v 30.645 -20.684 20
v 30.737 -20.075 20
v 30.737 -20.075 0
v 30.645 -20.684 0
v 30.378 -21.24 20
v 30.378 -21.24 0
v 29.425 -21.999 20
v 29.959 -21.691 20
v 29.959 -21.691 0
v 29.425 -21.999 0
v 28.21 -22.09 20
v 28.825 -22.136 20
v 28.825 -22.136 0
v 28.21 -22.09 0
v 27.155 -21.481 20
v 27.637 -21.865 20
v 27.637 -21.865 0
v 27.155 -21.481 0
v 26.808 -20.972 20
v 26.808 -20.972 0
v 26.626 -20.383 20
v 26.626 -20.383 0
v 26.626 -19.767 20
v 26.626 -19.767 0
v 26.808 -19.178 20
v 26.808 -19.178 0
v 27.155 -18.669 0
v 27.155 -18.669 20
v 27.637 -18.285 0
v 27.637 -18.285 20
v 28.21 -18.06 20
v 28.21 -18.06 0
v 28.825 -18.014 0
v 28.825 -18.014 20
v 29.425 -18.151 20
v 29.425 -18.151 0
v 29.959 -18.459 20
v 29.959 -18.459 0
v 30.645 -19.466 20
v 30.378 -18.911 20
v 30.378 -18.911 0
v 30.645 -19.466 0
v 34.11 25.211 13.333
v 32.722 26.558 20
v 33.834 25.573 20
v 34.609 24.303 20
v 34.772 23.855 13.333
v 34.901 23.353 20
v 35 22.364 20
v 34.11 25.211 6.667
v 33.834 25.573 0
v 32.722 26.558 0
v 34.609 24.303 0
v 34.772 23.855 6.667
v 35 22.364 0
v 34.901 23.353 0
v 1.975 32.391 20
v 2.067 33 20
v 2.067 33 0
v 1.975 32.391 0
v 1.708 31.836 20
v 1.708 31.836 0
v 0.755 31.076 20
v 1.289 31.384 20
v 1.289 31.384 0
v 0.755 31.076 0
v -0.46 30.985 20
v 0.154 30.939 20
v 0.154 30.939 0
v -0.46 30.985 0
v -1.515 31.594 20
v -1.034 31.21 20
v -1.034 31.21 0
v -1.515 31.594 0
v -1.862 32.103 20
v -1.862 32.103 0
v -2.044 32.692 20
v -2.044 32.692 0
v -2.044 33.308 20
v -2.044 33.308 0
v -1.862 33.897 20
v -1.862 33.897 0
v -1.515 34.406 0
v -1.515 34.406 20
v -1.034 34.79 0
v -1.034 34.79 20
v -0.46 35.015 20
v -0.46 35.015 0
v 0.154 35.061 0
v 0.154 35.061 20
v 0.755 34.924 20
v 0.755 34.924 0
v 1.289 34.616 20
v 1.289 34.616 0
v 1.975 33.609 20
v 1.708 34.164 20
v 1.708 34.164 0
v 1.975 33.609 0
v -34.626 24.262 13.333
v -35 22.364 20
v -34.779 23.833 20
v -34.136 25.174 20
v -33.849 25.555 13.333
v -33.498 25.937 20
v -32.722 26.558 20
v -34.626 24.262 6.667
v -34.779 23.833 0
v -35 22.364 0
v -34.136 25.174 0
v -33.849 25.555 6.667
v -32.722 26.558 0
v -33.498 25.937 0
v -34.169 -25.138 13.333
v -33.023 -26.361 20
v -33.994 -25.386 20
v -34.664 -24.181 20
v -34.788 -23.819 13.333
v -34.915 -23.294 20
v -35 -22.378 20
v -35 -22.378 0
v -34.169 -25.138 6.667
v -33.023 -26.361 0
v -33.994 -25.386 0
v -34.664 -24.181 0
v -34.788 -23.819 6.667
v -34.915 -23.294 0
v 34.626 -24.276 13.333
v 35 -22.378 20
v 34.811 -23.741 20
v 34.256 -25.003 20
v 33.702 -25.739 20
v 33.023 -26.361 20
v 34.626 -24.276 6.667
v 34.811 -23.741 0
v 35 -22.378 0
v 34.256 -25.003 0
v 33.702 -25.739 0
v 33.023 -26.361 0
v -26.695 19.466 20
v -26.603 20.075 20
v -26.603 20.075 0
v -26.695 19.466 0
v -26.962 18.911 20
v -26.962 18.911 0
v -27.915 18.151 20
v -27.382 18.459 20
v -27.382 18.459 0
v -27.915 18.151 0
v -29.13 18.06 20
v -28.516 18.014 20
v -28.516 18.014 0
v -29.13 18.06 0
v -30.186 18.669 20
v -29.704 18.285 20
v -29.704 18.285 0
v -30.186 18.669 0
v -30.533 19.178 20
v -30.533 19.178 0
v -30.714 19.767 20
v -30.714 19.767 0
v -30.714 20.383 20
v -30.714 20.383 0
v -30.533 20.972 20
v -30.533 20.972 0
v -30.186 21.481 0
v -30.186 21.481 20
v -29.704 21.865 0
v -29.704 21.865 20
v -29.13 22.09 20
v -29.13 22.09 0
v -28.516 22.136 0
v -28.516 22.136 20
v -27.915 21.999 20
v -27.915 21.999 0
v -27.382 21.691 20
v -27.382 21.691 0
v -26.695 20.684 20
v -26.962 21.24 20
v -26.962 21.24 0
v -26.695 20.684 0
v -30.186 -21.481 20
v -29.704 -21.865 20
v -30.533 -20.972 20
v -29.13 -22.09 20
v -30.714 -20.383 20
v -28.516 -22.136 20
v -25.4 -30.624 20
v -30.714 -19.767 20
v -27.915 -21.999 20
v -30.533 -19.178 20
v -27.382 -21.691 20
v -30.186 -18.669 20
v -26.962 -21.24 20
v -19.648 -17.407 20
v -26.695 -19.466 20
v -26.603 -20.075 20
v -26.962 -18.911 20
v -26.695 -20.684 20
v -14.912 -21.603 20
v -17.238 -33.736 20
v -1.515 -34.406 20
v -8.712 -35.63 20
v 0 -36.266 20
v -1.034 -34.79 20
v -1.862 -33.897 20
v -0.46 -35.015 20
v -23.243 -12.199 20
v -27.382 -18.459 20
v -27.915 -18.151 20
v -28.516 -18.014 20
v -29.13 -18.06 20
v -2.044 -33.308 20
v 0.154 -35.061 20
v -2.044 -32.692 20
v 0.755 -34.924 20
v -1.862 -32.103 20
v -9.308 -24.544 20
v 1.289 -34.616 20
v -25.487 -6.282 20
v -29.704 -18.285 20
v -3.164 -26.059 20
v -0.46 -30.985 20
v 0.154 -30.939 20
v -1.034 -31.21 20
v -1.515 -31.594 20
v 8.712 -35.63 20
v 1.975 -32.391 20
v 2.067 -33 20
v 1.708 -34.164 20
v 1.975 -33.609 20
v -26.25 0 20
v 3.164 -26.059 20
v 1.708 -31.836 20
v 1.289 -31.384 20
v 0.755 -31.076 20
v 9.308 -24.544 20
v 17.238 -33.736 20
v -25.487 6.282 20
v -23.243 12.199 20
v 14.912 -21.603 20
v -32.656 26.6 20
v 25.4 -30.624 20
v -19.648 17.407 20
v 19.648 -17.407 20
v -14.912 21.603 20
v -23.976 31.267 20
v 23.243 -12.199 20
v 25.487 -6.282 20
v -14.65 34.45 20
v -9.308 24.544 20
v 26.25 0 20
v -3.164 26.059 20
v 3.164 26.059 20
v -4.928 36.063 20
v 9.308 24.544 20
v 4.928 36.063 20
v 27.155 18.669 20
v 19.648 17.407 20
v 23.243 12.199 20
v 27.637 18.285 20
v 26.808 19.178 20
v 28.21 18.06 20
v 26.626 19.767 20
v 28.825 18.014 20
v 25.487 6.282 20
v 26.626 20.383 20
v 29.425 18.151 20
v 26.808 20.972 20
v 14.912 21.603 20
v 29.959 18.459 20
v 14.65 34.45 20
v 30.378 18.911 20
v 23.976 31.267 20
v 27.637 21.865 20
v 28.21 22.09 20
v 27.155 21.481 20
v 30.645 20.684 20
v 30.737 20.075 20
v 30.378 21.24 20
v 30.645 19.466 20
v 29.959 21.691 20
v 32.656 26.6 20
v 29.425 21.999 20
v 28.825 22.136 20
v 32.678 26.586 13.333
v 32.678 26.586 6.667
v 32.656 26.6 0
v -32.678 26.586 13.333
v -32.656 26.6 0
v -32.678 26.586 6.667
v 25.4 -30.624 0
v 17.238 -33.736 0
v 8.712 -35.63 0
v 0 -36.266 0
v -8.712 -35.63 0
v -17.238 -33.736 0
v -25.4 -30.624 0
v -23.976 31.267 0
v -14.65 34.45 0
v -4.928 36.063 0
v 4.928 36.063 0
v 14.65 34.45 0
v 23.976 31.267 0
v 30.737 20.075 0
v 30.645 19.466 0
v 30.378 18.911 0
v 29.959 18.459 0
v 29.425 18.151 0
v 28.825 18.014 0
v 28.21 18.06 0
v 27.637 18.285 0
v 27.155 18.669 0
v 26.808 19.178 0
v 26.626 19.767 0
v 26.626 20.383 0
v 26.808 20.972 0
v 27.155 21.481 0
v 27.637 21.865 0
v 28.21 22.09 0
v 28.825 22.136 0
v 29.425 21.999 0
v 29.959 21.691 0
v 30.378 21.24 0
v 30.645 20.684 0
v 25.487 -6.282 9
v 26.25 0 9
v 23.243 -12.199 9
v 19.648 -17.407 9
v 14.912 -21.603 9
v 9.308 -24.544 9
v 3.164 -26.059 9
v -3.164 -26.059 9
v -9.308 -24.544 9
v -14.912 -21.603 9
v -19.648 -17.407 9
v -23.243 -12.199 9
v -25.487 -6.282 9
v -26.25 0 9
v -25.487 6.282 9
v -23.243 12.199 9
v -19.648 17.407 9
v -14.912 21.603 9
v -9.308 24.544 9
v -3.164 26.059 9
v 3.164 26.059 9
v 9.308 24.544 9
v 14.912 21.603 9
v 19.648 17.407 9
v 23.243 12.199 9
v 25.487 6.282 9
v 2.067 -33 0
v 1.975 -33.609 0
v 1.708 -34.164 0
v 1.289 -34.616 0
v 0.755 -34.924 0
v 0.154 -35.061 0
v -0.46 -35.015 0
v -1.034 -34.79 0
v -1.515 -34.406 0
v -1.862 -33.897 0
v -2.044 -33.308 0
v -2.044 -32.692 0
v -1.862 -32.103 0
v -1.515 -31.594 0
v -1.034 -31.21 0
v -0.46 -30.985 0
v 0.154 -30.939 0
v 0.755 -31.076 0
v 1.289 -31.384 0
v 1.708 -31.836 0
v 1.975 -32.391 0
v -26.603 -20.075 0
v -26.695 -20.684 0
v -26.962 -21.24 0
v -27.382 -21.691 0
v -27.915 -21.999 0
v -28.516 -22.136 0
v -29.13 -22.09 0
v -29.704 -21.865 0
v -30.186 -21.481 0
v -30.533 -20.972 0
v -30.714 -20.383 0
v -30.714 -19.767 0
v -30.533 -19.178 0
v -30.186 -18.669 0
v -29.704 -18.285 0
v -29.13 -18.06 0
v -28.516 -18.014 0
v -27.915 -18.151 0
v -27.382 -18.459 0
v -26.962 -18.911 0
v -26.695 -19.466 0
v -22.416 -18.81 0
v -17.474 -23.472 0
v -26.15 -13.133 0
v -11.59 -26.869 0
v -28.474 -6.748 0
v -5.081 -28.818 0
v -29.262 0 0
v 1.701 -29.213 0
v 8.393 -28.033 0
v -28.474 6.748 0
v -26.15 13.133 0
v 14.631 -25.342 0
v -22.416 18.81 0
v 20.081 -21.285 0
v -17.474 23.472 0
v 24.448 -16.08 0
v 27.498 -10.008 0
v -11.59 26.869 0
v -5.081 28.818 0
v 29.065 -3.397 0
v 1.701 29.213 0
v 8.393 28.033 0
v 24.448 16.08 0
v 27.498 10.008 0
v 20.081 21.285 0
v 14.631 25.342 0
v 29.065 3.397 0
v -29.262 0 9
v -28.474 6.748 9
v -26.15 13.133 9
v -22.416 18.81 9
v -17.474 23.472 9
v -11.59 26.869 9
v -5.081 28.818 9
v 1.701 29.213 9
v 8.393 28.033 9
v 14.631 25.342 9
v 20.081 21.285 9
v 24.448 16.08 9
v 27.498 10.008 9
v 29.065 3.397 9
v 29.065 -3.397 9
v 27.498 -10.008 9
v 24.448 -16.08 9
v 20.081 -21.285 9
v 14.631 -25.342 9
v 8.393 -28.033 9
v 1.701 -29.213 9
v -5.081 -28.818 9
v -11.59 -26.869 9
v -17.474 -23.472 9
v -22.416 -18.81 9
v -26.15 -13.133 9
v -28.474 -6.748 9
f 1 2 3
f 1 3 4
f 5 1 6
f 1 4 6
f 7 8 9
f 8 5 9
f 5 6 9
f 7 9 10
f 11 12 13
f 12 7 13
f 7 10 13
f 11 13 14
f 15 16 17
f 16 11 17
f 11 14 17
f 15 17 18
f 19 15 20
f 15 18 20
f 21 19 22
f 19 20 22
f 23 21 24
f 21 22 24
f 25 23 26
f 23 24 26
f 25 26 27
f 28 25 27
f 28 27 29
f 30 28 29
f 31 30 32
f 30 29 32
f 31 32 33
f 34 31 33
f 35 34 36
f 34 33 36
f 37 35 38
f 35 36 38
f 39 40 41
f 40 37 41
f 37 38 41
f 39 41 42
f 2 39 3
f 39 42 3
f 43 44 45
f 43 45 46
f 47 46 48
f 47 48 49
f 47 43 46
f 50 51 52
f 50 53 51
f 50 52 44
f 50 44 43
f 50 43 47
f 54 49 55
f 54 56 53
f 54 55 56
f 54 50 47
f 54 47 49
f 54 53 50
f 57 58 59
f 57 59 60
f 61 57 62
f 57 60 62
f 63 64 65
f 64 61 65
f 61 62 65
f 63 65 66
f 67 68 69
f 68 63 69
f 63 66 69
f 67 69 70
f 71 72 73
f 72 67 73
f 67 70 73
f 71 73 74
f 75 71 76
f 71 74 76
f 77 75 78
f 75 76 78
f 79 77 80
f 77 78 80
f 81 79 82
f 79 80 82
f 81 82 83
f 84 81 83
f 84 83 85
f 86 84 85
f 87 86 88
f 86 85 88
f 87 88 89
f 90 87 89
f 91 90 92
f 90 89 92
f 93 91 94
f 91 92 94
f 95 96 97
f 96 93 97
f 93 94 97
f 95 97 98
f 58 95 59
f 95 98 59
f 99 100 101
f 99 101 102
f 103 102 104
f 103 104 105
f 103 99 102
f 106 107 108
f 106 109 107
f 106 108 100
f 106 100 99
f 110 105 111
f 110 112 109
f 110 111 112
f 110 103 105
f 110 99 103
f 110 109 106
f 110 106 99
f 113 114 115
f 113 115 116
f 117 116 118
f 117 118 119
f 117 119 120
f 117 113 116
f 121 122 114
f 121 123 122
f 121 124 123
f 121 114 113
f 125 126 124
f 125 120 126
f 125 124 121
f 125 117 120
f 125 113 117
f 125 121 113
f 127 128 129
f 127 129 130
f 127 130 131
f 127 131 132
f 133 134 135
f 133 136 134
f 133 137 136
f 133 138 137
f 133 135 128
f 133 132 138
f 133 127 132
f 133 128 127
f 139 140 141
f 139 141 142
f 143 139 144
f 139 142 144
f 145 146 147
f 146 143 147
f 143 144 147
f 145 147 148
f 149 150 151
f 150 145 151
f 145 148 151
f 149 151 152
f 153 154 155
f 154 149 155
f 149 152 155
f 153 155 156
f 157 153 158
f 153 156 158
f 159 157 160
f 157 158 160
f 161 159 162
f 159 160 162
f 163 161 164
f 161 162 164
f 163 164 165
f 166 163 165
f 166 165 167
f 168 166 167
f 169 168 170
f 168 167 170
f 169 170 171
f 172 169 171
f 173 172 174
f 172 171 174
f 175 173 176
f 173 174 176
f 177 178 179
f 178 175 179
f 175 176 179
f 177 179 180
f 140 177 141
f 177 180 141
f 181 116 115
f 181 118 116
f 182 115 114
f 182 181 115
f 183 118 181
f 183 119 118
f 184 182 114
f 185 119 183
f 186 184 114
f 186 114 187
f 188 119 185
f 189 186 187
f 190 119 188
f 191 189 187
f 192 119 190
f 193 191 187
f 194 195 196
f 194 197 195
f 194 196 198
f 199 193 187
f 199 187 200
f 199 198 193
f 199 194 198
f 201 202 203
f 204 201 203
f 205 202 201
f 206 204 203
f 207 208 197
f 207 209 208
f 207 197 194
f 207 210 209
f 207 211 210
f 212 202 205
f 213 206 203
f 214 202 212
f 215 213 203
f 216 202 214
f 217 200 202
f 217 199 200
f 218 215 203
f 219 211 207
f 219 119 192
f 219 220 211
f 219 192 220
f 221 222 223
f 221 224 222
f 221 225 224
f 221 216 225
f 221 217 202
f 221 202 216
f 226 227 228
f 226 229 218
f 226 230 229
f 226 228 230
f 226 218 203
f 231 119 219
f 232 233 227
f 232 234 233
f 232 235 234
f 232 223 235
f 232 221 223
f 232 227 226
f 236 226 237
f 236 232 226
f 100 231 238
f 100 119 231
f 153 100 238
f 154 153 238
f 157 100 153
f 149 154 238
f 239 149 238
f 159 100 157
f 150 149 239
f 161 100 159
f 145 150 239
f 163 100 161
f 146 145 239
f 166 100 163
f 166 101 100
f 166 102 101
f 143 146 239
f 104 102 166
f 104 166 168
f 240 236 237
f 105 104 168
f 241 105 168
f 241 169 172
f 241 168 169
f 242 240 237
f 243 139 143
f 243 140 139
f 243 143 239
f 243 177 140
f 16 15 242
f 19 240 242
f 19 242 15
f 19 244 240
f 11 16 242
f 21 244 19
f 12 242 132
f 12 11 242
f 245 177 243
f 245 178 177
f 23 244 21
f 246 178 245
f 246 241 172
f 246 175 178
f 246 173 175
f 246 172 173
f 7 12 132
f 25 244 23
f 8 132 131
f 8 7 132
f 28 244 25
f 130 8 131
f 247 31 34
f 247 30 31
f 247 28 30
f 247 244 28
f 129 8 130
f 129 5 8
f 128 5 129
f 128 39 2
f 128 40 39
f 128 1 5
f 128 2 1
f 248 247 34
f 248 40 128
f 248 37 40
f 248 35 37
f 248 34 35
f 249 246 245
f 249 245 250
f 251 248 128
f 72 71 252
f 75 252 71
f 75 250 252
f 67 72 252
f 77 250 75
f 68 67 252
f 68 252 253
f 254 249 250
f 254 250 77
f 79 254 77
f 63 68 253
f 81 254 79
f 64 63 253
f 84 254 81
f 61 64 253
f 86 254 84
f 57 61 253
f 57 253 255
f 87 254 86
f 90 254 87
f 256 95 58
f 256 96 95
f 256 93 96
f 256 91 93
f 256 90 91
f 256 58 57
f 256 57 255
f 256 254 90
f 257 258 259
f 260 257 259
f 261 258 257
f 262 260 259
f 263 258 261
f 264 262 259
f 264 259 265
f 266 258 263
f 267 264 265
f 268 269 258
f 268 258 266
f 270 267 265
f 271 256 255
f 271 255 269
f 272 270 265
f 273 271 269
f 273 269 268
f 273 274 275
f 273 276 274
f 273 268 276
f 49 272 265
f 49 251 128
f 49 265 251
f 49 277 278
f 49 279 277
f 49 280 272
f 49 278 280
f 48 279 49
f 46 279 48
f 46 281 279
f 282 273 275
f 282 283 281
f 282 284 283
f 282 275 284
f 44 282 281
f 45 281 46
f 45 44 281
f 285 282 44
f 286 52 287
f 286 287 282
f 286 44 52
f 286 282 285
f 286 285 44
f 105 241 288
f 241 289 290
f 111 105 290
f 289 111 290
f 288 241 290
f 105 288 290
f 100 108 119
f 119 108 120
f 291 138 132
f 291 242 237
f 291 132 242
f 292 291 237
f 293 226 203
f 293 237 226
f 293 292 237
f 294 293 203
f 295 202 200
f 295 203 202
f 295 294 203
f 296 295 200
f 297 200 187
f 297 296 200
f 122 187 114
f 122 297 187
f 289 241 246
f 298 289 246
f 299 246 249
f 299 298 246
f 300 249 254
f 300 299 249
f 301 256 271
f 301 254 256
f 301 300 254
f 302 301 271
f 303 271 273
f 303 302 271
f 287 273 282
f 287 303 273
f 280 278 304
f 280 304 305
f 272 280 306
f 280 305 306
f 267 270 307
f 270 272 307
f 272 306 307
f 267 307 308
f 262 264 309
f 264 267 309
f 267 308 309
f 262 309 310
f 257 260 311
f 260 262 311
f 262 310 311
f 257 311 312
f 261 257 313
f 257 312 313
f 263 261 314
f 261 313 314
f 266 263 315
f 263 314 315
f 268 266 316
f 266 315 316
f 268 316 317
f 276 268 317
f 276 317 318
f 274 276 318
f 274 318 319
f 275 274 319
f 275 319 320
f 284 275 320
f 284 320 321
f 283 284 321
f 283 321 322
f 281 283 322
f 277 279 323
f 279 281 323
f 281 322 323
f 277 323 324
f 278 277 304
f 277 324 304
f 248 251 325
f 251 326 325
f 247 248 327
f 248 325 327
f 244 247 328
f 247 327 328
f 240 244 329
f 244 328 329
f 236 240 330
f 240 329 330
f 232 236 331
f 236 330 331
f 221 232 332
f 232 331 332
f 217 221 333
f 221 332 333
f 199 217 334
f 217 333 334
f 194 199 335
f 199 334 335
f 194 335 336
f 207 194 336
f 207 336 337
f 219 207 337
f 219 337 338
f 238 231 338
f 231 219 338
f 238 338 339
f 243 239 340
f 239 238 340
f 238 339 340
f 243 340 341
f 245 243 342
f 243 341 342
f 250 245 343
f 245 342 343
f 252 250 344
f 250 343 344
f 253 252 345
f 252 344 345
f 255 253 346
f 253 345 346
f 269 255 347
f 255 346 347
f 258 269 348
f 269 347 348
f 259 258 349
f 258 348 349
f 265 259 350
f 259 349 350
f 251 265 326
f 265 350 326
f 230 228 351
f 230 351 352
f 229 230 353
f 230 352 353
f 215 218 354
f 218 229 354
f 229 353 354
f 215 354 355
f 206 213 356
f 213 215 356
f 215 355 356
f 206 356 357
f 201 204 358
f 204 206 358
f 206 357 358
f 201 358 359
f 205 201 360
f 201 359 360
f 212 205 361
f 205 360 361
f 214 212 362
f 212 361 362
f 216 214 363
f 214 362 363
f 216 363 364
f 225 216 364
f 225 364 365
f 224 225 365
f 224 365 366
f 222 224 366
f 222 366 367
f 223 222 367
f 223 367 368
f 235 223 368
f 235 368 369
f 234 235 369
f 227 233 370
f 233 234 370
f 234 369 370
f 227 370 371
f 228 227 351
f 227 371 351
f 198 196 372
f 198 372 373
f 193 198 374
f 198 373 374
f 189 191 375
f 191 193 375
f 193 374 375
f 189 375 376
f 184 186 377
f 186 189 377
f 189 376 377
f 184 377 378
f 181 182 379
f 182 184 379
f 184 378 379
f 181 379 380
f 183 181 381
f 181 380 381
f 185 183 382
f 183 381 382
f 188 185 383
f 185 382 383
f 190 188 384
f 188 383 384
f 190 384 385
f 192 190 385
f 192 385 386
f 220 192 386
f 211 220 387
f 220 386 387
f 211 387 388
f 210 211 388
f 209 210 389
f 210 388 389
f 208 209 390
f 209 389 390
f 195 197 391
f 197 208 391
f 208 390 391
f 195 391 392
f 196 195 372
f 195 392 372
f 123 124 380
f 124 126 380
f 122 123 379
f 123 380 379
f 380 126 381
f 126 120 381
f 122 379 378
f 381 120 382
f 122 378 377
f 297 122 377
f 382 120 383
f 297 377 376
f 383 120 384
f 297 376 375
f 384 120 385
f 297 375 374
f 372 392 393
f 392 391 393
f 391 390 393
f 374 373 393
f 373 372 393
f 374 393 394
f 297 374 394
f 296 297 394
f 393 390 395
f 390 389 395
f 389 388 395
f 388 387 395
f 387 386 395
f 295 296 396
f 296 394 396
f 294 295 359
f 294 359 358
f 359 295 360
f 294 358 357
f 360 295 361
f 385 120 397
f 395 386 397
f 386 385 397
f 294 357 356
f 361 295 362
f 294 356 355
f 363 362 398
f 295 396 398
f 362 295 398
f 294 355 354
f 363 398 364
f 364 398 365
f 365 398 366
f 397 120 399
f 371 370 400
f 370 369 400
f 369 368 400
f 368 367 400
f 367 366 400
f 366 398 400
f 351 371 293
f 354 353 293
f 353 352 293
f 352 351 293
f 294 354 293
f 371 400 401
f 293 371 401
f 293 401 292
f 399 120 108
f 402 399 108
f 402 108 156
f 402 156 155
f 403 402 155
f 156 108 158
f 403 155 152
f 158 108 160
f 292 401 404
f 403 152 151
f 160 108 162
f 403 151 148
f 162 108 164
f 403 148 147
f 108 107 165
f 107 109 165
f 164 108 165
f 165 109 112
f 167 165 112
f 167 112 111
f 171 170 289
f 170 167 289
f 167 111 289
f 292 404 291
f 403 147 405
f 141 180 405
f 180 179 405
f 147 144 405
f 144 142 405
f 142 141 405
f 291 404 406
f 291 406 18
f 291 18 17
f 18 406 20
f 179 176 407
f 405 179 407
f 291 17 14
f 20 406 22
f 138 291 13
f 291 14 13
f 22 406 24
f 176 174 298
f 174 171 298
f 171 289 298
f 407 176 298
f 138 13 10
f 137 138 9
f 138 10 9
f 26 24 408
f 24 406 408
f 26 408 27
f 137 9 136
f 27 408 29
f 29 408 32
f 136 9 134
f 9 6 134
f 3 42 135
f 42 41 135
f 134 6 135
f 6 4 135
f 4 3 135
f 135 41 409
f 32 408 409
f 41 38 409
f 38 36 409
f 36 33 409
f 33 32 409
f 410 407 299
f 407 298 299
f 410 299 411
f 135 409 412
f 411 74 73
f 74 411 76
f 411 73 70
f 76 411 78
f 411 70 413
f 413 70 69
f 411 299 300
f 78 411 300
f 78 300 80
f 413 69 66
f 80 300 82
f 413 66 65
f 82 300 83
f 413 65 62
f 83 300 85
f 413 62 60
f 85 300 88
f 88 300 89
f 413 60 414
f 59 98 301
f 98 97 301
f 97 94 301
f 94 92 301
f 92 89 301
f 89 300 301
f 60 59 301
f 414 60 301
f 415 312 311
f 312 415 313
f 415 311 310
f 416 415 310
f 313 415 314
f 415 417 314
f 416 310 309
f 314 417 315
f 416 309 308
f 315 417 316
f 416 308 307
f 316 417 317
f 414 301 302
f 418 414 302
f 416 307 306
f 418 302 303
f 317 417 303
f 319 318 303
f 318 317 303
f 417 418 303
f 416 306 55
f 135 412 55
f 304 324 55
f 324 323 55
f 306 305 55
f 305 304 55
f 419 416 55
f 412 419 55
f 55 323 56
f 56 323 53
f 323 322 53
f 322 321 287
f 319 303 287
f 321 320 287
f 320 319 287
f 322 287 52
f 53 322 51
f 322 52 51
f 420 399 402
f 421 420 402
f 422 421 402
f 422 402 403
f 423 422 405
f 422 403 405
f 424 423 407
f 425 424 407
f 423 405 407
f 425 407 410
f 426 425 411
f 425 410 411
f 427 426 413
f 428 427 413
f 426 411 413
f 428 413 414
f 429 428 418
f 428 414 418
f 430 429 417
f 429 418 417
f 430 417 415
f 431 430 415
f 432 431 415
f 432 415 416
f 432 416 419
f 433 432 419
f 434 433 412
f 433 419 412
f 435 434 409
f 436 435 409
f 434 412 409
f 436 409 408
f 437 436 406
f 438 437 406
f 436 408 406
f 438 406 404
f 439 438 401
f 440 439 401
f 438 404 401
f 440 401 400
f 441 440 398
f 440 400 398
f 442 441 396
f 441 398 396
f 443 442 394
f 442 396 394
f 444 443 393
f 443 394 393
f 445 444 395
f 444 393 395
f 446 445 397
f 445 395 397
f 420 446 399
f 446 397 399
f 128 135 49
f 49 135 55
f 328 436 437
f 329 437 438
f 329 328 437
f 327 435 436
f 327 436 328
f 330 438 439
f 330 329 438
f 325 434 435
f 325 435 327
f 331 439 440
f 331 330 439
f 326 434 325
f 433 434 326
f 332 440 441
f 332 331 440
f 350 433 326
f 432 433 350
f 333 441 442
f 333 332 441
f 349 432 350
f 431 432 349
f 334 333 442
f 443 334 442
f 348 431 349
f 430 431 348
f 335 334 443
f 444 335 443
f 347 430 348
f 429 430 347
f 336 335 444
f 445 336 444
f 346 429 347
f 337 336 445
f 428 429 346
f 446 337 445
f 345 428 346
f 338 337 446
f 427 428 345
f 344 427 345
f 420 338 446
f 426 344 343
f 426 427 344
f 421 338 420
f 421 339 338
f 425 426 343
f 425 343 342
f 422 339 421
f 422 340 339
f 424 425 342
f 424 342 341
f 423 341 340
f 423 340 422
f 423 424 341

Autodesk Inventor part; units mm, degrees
ref_plane "YZ Plane" through (0, 0, 0) normal (1, 0, 0) x (0, 1, 0)
ref_plane "XZ Plane" through (0, 0, 0) normal (0, 1, 0) x (-1, 0, 0)
ref_plane "XY Plane" through (0, 0, 0) normal (0, 0, 1) x (1, 0, 0)
sketch "Sketch1" plane through (0, 0, 0) normal (0, 0, 1) x (1, 0, 0)
  circle A0 centre (28.6703, -20.0752) radius 2.067
  circle A1 centre (-28.6703, 20.0752) radius 2.067
  circle A2 centre (-28.6703, -20.0752) radius 2.067
  circle A3 centre (28.6703, 20.0752) radius 2.067
  circle A4 centre (0, 33) radius 2.067
  circle A5 centre (0, -33) radius 2.067
  spline S0 degree 3 poles (-33.0232, -26.3606) (-33.4707, -26.0209) (-33.8582, -25.6078) (-34.4385, -24.7312) (-34.6469, -24.2869) (-34.9285, -23.3518) (-35, -22.866) (-35, -22.3776) knots 0.026434 0.026434 0.026434 0.026434 0.19535 0.19535 0.341801 0.341801 0.488319 0.488319 0.488319 0.488319
  arc A6 (-33.0232, -26.3606) -> (33.0232, -26.3606) centre (0, 23.734) ccw
  spline S1 degree 3 poles (35, -22.3776) (35, -23.0287) (34.8729, -23.6735) (34.4404, -24.7277) (34.1898, -25.15) (33.6298, -25.8399) (33.3414, -26.119) (33.0232, -26.3606) knots 0 0 0 0 0.195306 0.195306 0.341836 0.341836 0.461894 0.461894 0.461894 0.461894
  line L0 (35, -22.3776) -> (35, 22.3638)
  spline S2 degree 3 poles (32.722, 26.5579) (33.2681, 26.2035) (33.7398, 25.7458) (34.3984, 24.7948) (34.6216, 24.3377) (34.9233, 23.3723) (35, 22.8695) (35, 22.3638) knots 0 0 0 0 0.195321 0.195321 0.347039 0.347039 0.498754 0.498754 0.498754 0.498754
  spline S3 degree 3 poles (32.6565, 26.6005) (32.6783, 26.5863) (32.7001, 26.5721) (32.722, 26.5579) knots 0 0 0 0 0.007808 0.007808 0.007808 0.007808
  arc A7 (32.6565, 26.6005) -> (-32.6565, 26.6005) centre (0, -23.734) ccw
  spline S4 degree 3 poles (-32.6565, 26.6005) (-32.6783, 26.5863) (-32.7001, 26.5721) (-32.722, 26.5579) knots -3.47 -3.47 -3.47 -3.47 -3.462013 -3.462013 -3.462013 -3.462013
  spline S5 degree 3 poles (-35, 22.3638) (-35, 23.0149) (-34.8728, 23.6598) (-34.4336, 24.7299) (-34.1718, 25.166) (-33.5262, 25.9446) (-33.1462, 26.2826) (-32.722, 26.5579) knots 0 0 0 0 0.195326 0.195326 0.347039 0.347039 0.498754 0.498754 0.498754 0.498754
  line L1 (-35, 22.3638) -> (-35, -22.3776)
  circle A8 centre (0, 0) radius 26.25
  dimension "d2" = 33
  dimension "d3" = 33
extrude "Extrusion1" add sketch "Sketch1" along normal blind 20
sketch "Sketch2" plane through (0, 0, 0) normal (0, 0, -1) x (-1, 0, 0)
  circle A0 centre (0, 0) radius 29.2625
  dimension "d4" = 58.525
extrude "Extrusion2" cut sketch "Sketch2" against normal blind 9
properties part number "Tilting head - extended part" material "Steel, Carbon"
